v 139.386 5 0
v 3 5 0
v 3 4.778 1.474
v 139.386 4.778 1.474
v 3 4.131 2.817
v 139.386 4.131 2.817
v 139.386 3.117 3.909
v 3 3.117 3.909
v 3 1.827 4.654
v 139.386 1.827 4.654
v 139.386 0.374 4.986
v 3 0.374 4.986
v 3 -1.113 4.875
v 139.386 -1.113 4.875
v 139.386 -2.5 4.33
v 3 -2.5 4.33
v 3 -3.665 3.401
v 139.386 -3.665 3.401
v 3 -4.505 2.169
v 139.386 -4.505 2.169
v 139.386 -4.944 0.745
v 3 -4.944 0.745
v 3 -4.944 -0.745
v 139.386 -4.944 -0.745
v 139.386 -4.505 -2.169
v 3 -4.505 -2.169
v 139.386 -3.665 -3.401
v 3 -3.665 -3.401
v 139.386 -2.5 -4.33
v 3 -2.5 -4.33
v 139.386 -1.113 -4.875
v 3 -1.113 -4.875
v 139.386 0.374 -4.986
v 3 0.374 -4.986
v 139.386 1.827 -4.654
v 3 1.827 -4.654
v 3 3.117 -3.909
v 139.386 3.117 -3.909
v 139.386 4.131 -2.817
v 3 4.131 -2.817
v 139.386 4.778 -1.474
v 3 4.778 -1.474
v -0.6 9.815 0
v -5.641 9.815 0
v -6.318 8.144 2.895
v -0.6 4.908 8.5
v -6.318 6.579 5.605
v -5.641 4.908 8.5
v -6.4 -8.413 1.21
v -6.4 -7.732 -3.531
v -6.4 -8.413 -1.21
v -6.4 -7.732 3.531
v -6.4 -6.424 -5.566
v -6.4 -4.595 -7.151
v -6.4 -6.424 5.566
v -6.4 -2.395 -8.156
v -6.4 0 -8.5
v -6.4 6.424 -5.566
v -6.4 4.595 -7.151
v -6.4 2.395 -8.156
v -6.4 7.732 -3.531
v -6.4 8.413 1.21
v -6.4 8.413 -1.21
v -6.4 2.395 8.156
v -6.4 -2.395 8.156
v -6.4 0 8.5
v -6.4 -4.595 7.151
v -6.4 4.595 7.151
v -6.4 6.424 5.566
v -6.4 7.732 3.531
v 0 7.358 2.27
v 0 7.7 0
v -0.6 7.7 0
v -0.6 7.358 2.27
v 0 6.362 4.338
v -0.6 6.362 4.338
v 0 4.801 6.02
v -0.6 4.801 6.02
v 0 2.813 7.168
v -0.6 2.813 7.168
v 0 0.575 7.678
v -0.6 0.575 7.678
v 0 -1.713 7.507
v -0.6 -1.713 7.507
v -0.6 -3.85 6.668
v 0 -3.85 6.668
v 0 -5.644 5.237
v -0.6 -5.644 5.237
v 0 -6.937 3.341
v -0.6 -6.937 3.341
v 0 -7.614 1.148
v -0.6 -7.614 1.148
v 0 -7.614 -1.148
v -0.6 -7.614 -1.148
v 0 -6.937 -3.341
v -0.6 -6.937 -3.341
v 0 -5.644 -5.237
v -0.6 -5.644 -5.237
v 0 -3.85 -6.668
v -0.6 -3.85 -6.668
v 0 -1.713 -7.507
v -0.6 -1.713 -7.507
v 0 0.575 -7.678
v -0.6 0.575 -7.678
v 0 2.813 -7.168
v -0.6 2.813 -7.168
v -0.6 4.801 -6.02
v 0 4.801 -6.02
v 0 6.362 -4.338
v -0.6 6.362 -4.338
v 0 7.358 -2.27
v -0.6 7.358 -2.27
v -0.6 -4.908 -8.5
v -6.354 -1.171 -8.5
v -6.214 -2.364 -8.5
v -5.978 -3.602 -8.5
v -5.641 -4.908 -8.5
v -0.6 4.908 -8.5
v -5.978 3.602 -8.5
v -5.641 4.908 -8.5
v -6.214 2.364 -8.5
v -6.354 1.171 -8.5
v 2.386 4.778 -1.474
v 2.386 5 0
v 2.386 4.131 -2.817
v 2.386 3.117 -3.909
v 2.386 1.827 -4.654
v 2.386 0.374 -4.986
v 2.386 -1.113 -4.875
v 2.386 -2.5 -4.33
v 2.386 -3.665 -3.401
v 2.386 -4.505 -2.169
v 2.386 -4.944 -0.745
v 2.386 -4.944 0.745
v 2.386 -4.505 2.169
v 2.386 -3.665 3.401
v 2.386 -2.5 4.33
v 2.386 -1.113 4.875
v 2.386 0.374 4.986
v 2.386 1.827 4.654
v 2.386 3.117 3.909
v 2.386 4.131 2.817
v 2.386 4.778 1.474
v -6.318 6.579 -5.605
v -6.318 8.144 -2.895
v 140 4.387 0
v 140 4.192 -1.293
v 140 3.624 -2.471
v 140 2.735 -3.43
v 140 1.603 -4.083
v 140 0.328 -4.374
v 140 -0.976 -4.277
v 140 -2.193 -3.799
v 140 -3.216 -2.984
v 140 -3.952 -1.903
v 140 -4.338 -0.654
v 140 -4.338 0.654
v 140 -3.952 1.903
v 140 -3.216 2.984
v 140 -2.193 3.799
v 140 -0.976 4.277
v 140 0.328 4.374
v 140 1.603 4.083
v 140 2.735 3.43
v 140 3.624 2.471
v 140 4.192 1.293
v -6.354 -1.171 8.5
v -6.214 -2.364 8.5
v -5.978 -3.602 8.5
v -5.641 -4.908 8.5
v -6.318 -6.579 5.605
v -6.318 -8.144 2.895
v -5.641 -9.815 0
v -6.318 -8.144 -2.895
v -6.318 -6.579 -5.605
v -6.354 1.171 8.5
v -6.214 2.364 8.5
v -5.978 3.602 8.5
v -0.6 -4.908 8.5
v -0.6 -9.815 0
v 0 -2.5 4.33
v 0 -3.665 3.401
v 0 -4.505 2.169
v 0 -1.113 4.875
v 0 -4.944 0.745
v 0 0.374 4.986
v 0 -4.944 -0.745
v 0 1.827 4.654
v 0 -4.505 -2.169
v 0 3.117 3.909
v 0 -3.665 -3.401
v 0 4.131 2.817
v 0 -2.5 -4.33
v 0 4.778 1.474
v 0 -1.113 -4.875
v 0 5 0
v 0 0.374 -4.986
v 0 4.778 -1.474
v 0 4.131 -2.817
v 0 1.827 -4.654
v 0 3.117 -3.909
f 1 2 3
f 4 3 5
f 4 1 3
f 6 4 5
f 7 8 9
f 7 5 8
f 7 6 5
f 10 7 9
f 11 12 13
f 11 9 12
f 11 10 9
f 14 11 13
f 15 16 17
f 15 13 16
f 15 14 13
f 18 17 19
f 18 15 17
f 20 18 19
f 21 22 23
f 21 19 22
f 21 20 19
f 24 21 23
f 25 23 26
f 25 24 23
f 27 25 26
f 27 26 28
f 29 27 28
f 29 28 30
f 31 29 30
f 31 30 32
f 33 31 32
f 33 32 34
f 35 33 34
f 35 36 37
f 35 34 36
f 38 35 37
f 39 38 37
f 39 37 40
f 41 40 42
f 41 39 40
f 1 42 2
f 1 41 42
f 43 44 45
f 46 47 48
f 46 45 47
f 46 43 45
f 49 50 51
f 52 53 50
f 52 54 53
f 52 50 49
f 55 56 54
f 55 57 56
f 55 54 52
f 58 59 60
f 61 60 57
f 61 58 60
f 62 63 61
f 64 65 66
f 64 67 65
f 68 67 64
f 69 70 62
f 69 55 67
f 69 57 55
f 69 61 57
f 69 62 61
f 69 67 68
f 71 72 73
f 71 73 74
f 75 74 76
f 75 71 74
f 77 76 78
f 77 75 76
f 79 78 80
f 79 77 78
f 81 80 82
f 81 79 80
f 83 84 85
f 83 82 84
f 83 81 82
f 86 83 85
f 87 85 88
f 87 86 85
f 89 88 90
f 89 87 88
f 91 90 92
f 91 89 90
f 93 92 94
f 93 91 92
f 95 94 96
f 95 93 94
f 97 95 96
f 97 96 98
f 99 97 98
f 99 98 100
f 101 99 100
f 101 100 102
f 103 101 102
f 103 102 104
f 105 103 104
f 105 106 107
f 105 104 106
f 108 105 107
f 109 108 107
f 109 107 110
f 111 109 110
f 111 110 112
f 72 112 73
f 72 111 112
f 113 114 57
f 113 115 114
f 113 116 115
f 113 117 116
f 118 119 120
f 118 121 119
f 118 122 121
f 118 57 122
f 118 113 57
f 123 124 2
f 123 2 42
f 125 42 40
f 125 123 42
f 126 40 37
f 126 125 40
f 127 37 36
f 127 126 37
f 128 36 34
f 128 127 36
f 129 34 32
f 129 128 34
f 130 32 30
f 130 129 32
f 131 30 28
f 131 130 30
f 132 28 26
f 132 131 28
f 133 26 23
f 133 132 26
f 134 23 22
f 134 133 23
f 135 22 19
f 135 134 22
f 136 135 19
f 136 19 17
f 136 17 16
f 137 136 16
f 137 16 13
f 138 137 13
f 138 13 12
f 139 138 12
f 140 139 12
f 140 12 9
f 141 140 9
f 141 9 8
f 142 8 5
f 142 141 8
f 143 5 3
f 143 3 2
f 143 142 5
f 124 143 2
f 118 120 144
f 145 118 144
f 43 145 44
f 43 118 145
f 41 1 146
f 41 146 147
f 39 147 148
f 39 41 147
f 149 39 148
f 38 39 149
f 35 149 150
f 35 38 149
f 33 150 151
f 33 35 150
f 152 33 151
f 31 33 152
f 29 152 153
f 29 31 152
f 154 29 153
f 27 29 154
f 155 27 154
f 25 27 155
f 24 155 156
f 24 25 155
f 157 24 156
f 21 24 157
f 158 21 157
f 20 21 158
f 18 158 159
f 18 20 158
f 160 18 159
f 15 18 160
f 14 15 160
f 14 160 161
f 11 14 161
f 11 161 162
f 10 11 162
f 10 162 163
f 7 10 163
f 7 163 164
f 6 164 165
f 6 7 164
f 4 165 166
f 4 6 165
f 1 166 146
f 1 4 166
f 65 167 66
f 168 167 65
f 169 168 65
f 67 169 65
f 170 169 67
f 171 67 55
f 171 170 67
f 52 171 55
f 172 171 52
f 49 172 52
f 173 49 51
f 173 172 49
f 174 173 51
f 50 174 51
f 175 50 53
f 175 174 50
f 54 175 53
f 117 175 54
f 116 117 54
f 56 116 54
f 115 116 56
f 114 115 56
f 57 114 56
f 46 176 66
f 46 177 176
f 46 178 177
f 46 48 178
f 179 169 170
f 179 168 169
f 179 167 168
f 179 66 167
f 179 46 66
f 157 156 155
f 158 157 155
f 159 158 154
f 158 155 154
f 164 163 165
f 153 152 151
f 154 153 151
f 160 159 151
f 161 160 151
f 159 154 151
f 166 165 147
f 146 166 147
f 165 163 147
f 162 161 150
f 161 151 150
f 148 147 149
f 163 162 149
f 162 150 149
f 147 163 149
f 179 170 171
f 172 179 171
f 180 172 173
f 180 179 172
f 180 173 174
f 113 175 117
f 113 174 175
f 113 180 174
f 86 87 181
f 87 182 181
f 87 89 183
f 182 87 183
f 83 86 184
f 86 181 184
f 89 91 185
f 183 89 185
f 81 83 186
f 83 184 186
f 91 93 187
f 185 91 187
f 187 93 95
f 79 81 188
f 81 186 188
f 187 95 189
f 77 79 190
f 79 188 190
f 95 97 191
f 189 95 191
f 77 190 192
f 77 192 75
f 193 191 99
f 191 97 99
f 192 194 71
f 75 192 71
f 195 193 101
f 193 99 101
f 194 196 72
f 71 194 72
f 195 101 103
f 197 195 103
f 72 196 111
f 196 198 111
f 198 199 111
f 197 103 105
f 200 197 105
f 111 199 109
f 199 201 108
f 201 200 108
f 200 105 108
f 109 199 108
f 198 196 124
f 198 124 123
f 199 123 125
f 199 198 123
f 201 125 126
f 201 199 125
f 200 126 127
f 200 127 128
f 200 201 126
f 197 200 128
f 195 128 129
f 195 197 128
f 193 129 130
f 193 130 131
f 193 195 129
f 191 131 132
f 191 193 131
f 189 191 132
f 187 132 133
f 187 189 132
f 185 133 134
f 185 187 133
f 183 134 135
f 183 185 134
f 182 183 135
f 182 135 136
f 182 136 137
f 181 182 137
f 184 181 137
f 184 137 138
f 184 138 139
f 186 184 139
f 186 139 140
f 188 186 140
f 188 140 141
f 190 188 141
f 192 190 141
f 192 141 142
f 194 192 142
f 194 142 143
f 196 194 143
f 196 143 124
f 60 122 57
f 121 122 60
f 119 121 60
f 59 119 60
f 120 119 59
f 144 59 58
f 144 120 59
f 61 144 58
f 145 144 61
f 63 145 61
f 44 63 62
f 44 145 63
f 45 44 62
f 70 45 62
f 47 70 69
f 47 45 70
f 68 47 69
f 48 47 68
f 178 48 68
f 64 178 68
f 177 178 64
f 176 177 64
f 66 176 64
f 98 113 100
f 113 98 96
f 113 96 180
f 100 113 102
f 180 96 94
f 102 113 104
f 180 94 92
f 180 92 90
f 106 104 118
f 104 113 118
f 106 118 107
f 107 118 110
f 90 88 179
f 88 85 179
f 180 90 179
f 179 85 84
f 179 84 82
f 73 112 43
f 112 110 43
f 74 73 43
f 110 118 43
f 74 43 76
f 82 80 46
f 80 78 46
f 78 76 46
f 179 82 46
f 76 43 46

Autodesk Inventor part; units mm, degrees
ref_plane "YZ Plane" through (0, 0, 0) normal (1, 0, 0) x (0, 1, 0)
ref_plane "XZ Plane" through (0, 0, 0) normal (0, 1, 0) x (-1, 0, 0)
sketch "Skizze1" plane through (0, 0, 0) normal (0, 0, 1) x (1, 0, 0)
  line L0 (0, 7.7) -> (0, 5)
  line L1 (3, 5) -> (140, 5)
  line L2 (140, 5) -> (140, 0)
  line L3 (140, 0) -> (-0.6001, 0)
  line L4 (-28.7201, 0) -> (168.12, 0) projected
  line L5 (-0.6001, 0) -> (-0.6001, 7.7)
  line L6 (-0.6001, 7.7) -> (0, 7.7)
  line L7 (3, 5) -> (2.3864, 5)
  line L8 (2.3864, 5) -> (0, 5)
  line L9 (0, -1.54) -> (0, 9.24) projected
  dimension "d0" = 140
  dimension "d1" = 137
  dimension "d2" = 10
  dimension "d9" = 0.6001
  dimension "d10" = 15.4
  dimension "d13" = 0.6136
  dimension "d14" = 10
revolve "Körper" add sketch "Skizze1" angle 360 about axis through (140, 0, 0) along (-1, 0, 0)
sketch "Skizze2" plane through (-0.6001, 0, 0) normal (-1, 0, 0) x (0, 0, 1)
  line L0 (0, 9.815) -> (8.5, 4.9075)
  line L1 (8.5, 4.9075) -> (8.5, -4.9075)
  line L2 (8.5, -4.9075) -> (0, -9.815)
  line L3 (0, -9.815) -> (-8.5, -4.9075)
  line L4 (-8.5, -4.9075) -> (-8.5, 4.9075)
  line L5 (-8.5, 4.9075) -> (0, 9.815)
  point P0 (0, 0)
  point P1 (0, 0)
  dimension "d11" = 17
extrude "Kopf" add sketch "Skizze2" along normal blind 5.8
sketch "Skizze4" plane through (0, 0, 0) normal (0, 0, 1) x (1, 0, 0)
  line L0 (-6.4001, 8.5) -> (-6.4001, 9.815)
  line L1 (-6.4001, 9.815) -> (-5.6409, 9.815)
  line L2 (-5.6409, 9.815) -> (-6.4001, 8.5)
  line L3 (-7.5601, 0) -> (0.5599, 0) projected
  line L4 (-0.6001, 9.815) -> (-6.4001, 9.815) projected
  line L5 (-6.4001, 4.9075) -> (-6.4001, 9.815) projected
  dimension "d5" = 30
  dimension "d19" = 17
revolve "Fase1" cut sketch "Skizze4" angle 360 about axis through (-10, 0, 0) along (1, 0, 0)
thread "Gewinde" size "M10x1" class "6g" standard "ISO Metric profile" length 137
chamfer "Fase2" distance 0.6134 distance2 0.6136 1 edges at (140, -5, 0) measured on face at (140, 2.3641, -0.6817)
ref_plane "Work Plane1" through (1.525, 0, 0) normal (0, 0, 1) x (1, 0, 0)
equation "\"d0\" = NLG"
equation "\"d1\" = GEL"
equation "\"d2\" = GD"
equation "\"d10\" = SD2"
equation "\"d14\" = BDM"
equation "\"d11\" = SW"
equation "\"d3\" = KOH - SD"
equation "\"d5\" = ANG1"
equation "\"d19\" = SW0"
equation "\"d15\" = GEL"
equation "\"d6\" = -0.5 * SPD + 0.5 * GD"
equation "\"NLG\" = 140"
equation "\"GD\" = NND"
equation "\"BDM\" = NND"
equation "\"KOH\" = 6.4"
equation "\"GEL\" = 137"
equation "\"SW\" = 17"
equation "\"SW0\" = 17"
equation "\"SPD\" = NND - 1.2269 * PTC"
equation "\"SD2\" = 15.4"
equation "\"SD\" = 0.6"
equation "\"ANG1\" = 30deg"
equation "\"GAL\" = 0.61345 * PTC"
equation "\"GUL\" = 0.61345 * PTC"
equation "\"RR\" = 0"
equation "\"GD1\" = THREADDIA - 1.2269 * PTC"
equation "\"TOA\" = 30deg"
equation "\"FAWI\" = 45deg"
equation "\"PTC\" = 1"
equation "\"E0\" = 1.155 * SW"
equation "\"NND\" = 10"
equation "\"THREADDIA\" = 10"
properties part number "DIN 961 - M10 x 140" material "Stahl, weich"
